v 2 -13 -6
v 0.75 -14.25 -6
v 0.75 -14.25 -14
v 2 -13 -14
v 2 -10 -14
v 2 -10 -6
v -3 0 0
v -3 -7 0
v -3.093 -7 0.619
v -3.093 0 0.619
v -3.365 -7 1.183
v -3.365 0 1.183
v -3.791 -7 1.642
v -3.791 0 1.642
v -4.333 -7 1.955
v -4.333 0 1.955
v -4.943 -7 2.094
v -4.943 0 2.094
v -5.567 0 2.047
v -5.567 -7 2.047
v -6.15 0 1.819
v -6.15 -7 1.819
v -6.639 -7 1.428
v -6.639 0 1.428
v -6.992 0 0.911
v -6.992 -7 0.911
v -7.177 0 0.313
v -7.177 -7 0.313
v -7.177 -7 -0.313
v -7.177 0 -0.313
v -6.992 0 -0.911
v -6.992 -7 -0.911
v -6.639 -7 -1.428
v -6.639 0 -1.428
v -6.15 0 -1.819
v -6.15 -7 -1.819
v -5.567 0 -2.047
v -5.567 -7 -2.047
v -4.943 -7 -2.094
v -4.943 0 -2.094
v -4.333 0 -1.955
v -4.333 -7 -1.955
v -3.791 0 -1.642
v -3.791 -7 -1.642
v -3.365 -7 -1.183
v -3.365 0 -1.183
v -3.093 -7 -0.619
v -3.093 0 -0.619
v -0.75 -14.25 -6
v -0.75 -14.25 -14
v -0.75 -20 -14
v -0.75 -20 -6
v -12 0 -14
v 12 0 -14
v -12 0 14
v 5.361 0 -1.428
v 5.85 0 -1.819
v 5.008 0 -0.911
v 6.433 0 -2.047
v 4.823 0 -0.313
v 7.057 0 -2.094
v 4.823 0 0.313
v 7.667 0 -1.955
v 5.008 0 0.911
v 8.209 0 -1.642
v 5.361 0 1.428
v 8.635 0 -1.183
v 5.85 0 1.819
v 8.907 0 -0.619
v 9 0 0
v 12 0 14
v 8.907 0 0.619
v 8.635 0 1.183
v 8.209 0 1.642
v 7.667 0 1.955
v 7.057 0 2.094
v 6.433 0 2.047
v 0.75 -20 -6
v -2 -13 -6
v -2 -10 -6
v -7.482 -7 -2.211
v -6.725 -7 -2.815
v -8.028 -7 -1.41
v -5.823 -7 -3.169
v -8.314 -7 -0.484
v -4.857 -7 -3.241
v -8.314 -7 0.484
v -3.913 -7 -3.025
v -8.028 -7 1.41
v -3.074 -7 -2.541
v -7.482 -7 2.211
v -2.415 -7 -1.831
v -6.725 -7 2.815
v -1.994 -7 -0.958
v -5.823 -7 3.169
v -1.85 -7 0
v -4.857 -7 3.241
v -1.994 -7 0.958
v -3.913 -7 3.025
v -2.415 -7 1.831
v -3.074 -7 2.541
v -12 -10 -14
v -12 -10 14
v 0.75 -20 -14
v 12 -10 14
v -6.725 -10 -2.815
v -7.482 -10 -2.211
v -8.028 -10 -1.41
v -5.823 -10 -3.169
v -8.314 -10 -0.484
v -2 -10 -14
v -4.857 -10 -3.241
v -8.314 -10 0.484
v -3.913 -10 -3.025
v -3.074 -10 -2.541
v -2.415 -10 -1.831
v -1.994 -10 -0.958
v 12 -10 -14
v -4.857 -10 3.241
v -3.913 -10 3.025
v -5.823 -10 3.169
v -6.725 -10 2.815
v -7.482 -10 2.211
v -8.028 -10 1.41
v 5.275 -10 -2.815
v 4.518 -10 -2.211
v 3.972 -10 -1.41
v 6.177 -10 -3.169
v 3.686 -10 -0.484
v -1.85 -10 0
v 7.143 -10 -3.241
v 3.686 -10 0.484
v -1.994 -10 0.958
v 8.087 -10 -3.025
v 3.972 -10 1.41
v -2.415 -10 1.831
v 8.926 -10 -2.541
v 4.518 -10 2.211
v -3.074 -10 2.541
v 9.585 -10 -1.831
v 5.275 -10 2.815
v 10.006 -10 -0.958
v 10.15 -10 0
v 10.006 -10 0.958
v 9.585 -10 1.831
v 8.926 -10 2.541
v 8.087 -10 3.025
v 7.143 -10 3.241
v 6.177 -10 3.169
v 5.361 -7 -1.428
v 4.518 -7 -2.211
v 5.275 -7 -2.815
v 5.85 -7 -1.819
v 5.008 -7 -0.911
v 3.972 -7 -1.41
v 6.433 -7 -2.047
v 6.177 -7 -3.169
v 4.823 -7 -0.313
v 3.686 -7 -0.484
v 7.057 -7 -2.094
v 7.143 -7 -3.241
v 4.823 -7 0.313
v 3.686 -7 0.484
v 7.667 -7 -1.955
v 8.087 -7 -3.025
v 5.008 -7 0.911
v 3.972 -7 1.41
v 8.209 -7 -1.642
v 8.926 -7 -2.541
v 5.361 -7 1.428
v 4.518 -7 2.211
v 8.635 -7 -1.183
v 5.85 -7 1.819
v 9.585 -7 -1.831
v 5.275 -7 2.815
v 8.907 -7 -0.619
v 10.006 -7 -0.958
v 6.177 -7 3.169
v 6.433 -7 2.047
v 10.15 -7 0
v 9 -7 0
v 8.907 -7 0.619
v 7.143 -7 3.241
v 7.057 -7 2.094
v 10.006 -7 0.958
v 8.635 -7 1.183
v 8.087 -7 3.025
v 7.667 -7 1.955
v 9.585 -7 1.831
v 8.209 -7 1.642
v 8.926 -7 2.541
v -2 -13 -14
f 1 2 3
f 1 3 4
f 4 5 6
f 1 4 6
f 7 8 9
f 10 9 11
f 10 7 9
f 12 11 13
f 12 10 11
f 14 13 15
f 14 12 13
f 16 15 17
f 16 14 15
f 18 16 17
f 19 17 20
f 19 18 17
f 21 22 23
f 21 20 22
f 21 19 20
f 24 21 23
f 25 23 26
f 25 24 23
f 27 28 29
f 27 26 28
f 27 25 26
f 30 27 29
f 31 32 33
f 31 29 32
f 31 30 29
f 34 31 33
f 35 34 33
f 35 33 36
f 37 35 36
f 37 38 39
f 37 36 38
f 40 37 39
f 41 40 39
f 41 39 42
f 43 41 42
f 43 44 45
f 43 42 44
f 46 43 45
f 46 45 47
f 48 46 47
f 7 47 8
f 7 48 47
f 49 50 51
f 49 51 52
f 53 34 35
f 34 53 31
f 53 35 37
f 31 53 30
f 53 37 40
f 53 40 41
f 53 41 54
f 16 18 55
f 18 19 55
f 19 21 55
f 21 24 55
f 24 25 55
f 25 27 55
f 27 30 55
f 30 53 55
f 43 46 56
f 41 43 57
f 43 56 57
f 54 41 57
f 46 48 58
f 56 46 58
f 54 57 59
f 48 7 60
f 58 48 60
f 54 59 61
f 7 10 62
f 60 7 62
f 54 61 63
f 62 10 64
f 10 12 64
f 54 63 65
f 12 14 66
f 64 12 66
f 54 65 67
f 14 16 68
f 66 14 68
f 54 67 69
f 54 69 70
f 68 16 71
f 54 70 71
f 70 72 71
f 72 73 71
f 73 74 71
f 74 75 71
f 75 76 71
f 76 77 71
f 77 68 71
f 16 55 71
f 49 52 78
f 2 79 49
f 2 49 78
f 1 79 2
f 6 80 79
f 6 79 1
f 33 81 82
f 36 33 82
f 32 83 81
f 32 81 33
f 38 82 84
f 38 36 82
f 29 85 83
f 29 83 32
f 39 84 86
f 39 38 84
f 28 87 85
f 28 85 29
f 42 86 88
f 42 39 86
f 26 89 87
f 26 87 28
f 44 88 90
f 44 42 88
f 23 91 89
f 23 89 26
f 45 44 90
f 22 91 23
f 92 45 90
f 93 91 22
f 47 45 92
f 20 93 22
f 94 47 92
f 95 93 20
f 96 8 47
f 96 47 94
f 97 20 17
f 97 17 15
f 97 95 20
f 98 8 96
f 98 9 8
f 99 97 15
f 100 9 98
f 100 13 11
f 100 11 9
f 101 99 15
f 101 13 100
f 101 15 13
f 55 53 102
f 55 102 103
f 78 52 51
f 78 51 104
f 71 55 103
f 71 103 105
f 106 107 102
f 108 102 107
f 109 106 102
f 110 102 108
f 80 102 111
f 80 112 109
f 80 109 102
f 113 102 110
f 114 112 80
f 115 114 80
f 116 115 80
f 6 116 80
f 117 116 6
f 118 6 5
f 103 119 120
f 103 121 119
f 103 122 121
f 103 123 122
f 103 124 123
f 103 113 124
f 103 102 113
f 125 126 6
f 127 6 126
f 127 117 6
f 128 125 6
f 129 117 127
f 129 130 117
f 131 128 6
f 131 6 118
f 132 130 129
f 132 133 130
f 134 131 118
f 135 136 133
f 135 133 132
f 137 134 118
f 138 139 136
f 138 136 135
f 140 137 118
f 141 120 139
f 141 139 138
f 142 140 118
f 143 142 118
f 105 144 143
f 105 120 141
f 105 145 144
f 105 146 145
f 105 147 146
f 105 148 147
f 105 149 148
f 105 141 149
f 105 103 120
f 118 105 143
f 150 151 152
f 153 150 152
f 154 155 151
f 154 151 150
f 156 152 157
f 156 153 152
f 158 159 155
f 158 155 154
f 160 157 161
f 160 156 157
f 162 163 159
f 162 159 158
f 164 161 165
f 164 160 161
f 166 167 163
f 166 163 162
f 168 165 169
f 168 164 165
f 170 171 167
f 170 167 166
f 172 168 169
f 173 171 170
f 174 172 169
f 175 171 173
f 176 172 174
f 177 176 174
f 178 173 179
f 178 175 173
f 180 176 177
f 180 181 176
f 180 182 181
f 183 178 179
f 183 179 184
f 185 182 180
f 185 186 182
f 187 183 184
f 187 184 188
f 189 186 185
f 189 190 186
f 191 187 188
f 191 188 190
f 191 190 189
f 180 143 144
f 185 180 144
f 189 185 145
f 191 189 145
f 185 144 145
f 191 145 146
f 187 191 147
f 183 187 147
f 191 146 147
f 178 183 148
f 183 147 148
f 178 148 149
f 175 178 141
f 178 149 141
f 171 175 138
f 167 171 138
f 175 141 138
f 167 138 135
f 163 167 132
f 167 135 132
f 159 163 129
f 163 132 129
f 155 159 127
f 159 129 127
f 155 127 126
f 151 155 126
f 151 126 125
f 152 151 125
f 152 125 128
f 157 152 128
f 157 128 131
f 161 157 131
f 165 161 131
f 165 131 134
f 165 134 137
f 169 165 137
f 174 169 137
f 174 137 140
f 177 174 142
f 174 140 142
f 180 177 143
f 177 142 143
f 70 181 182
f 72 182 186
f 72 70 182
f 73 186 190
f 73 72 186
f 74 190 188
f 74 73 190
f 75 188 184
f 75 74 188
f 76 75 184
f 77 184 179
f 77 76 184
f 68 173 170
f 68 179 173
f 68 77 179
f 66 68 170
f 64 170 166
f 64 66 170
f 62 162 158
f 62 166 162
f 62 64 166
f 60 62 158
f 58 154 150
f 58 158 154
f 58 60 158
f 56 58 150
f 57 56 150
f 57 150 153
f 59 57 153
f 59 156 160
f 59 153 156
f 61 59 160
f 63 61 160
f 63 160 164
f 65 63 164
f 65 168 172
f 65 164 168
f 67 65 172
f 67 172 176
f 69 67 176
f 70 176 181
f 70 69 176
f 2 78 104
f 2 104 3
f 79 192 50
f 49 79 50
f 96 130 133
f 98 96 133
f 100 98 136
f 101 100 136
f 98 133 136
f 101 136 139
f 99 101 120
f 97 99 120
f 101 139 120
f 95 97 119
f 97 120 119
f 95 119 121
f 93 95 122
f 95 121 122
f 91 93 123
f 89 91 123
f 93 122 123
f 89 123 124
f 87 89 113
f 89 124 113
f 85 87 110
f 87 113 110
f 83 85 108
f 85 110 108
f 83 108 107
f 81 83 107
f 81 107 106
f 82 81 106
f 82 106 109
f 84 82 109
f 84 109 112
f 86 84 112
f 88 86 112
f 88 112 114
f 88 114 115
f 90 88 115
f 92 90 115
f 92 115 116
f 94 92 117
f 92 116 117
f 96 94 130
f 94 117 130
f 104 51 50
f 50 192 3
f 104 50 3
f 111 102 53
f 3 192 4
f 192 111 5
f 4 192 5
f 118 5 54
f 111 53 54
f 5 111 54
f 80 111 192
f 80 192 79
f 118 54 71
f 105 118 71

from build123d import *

# Parameters (mm, degrees)
F0_W        = 24
F0_H        = 28
F0_R        = 2.1
F1_DEPTH    = 10
F2_W        = 4
F2_H        = 8
F3_DEPTH    = 5
F4_W        = 1.5
F4_H        = 8
F5_DEPTH    = 5
F6_T4_DEPTH = 18.2867319519
F6_T9_DEPTH = 18.2867319519
F7_R        = 3.25
F8_DEPTH    = 3


# Not quite as in the source:
# - a fillet or chamfer that OpenCascade refuses, or shapes differently, is made with other operations: its cross-section is extruded or revolved along the edge and cut away or added


with BuildPart() as f1:
    # F0 (on Front) → F1 (new body)
    with BuildSketch(Plane.XZ):
        Rectangle(F0_W, F0_H)
        with Locations((-5.1, 0)):
            Circle(F0_R, mode=Mode.SUBTRACT)
        with Locations((6.9, 0)):
            Circle(F0_R, mode=Mode.SUBTRACT)
    extrude(amount=F1_DEPTH)

    # F2 (on face) → F3 (join)
    with BuildSketch(Plane.XZ.offset(10)):
        with Locations((0, -10)):
            Rectangle(F2_W, F2_H)
    extrude(amount=F3_DEPTH)

    # F4 (on face) → F5 (join)
    with BuildSketch(Plane.XZ.offset(15)):
        with Locations((0, -10)):
            Rectangle(F4_W, F4_H)
    extrude(amount=F5_DEPTH)

    # F6: chamfer of 2 on 2 edges, made by hand


with BuildPart() as f6_tool2:
    # F6_s3 → F6_t4 (new body)
    with BuildSketch(Plane.XY.offset(-19.1433659759)):
        Polygon((0, -15), (2, -13), (2, -15), align=None)
    extrude(amount=F6_T4_DEPTH)

    split(bisect_by=Plane.YZ.offset(0.75), keep=Keep.TOP)


with BuildPart() as f1_1:
    add(f1.part)

    # F6_t1: cut F6_tool2
    add(f6_tool2.part, mode=Mode.SUBTRACT)


with BuildPart() as f6_tool7:
    # F6_s8 → F6_t9 (new body)
    with BuildSketch(Plane.XY.offset(-0.8566340241)):
        Polygon((-2, -13), (0, -15), (-2, -15), align=None)
    extrude(amount=-F6_T9_DEPTH)

    split(bisect_by=Plane.YZ.offset(-0.75), keep=Keep.BOTTOM)


with BuildPart() as f1_2:
    add(f1_1.part)

    # F6_t6: cut F6_tool7
    add(f6_tool7.part, mode=Mode.SUBTRACT)

    # F7 (on face) → F8 (cut)
    with BuildSketch(Plane.XZ.offset(10)):
        with Locations((-5.1, 0)):
            Circle(F7_R)
        with Locations((6.9, 0)):
            Circle(F7_R)
    extrude(amount=-F8_DEPTH, mode=Mode.SUBTRACT)


solid = f1_2.part
